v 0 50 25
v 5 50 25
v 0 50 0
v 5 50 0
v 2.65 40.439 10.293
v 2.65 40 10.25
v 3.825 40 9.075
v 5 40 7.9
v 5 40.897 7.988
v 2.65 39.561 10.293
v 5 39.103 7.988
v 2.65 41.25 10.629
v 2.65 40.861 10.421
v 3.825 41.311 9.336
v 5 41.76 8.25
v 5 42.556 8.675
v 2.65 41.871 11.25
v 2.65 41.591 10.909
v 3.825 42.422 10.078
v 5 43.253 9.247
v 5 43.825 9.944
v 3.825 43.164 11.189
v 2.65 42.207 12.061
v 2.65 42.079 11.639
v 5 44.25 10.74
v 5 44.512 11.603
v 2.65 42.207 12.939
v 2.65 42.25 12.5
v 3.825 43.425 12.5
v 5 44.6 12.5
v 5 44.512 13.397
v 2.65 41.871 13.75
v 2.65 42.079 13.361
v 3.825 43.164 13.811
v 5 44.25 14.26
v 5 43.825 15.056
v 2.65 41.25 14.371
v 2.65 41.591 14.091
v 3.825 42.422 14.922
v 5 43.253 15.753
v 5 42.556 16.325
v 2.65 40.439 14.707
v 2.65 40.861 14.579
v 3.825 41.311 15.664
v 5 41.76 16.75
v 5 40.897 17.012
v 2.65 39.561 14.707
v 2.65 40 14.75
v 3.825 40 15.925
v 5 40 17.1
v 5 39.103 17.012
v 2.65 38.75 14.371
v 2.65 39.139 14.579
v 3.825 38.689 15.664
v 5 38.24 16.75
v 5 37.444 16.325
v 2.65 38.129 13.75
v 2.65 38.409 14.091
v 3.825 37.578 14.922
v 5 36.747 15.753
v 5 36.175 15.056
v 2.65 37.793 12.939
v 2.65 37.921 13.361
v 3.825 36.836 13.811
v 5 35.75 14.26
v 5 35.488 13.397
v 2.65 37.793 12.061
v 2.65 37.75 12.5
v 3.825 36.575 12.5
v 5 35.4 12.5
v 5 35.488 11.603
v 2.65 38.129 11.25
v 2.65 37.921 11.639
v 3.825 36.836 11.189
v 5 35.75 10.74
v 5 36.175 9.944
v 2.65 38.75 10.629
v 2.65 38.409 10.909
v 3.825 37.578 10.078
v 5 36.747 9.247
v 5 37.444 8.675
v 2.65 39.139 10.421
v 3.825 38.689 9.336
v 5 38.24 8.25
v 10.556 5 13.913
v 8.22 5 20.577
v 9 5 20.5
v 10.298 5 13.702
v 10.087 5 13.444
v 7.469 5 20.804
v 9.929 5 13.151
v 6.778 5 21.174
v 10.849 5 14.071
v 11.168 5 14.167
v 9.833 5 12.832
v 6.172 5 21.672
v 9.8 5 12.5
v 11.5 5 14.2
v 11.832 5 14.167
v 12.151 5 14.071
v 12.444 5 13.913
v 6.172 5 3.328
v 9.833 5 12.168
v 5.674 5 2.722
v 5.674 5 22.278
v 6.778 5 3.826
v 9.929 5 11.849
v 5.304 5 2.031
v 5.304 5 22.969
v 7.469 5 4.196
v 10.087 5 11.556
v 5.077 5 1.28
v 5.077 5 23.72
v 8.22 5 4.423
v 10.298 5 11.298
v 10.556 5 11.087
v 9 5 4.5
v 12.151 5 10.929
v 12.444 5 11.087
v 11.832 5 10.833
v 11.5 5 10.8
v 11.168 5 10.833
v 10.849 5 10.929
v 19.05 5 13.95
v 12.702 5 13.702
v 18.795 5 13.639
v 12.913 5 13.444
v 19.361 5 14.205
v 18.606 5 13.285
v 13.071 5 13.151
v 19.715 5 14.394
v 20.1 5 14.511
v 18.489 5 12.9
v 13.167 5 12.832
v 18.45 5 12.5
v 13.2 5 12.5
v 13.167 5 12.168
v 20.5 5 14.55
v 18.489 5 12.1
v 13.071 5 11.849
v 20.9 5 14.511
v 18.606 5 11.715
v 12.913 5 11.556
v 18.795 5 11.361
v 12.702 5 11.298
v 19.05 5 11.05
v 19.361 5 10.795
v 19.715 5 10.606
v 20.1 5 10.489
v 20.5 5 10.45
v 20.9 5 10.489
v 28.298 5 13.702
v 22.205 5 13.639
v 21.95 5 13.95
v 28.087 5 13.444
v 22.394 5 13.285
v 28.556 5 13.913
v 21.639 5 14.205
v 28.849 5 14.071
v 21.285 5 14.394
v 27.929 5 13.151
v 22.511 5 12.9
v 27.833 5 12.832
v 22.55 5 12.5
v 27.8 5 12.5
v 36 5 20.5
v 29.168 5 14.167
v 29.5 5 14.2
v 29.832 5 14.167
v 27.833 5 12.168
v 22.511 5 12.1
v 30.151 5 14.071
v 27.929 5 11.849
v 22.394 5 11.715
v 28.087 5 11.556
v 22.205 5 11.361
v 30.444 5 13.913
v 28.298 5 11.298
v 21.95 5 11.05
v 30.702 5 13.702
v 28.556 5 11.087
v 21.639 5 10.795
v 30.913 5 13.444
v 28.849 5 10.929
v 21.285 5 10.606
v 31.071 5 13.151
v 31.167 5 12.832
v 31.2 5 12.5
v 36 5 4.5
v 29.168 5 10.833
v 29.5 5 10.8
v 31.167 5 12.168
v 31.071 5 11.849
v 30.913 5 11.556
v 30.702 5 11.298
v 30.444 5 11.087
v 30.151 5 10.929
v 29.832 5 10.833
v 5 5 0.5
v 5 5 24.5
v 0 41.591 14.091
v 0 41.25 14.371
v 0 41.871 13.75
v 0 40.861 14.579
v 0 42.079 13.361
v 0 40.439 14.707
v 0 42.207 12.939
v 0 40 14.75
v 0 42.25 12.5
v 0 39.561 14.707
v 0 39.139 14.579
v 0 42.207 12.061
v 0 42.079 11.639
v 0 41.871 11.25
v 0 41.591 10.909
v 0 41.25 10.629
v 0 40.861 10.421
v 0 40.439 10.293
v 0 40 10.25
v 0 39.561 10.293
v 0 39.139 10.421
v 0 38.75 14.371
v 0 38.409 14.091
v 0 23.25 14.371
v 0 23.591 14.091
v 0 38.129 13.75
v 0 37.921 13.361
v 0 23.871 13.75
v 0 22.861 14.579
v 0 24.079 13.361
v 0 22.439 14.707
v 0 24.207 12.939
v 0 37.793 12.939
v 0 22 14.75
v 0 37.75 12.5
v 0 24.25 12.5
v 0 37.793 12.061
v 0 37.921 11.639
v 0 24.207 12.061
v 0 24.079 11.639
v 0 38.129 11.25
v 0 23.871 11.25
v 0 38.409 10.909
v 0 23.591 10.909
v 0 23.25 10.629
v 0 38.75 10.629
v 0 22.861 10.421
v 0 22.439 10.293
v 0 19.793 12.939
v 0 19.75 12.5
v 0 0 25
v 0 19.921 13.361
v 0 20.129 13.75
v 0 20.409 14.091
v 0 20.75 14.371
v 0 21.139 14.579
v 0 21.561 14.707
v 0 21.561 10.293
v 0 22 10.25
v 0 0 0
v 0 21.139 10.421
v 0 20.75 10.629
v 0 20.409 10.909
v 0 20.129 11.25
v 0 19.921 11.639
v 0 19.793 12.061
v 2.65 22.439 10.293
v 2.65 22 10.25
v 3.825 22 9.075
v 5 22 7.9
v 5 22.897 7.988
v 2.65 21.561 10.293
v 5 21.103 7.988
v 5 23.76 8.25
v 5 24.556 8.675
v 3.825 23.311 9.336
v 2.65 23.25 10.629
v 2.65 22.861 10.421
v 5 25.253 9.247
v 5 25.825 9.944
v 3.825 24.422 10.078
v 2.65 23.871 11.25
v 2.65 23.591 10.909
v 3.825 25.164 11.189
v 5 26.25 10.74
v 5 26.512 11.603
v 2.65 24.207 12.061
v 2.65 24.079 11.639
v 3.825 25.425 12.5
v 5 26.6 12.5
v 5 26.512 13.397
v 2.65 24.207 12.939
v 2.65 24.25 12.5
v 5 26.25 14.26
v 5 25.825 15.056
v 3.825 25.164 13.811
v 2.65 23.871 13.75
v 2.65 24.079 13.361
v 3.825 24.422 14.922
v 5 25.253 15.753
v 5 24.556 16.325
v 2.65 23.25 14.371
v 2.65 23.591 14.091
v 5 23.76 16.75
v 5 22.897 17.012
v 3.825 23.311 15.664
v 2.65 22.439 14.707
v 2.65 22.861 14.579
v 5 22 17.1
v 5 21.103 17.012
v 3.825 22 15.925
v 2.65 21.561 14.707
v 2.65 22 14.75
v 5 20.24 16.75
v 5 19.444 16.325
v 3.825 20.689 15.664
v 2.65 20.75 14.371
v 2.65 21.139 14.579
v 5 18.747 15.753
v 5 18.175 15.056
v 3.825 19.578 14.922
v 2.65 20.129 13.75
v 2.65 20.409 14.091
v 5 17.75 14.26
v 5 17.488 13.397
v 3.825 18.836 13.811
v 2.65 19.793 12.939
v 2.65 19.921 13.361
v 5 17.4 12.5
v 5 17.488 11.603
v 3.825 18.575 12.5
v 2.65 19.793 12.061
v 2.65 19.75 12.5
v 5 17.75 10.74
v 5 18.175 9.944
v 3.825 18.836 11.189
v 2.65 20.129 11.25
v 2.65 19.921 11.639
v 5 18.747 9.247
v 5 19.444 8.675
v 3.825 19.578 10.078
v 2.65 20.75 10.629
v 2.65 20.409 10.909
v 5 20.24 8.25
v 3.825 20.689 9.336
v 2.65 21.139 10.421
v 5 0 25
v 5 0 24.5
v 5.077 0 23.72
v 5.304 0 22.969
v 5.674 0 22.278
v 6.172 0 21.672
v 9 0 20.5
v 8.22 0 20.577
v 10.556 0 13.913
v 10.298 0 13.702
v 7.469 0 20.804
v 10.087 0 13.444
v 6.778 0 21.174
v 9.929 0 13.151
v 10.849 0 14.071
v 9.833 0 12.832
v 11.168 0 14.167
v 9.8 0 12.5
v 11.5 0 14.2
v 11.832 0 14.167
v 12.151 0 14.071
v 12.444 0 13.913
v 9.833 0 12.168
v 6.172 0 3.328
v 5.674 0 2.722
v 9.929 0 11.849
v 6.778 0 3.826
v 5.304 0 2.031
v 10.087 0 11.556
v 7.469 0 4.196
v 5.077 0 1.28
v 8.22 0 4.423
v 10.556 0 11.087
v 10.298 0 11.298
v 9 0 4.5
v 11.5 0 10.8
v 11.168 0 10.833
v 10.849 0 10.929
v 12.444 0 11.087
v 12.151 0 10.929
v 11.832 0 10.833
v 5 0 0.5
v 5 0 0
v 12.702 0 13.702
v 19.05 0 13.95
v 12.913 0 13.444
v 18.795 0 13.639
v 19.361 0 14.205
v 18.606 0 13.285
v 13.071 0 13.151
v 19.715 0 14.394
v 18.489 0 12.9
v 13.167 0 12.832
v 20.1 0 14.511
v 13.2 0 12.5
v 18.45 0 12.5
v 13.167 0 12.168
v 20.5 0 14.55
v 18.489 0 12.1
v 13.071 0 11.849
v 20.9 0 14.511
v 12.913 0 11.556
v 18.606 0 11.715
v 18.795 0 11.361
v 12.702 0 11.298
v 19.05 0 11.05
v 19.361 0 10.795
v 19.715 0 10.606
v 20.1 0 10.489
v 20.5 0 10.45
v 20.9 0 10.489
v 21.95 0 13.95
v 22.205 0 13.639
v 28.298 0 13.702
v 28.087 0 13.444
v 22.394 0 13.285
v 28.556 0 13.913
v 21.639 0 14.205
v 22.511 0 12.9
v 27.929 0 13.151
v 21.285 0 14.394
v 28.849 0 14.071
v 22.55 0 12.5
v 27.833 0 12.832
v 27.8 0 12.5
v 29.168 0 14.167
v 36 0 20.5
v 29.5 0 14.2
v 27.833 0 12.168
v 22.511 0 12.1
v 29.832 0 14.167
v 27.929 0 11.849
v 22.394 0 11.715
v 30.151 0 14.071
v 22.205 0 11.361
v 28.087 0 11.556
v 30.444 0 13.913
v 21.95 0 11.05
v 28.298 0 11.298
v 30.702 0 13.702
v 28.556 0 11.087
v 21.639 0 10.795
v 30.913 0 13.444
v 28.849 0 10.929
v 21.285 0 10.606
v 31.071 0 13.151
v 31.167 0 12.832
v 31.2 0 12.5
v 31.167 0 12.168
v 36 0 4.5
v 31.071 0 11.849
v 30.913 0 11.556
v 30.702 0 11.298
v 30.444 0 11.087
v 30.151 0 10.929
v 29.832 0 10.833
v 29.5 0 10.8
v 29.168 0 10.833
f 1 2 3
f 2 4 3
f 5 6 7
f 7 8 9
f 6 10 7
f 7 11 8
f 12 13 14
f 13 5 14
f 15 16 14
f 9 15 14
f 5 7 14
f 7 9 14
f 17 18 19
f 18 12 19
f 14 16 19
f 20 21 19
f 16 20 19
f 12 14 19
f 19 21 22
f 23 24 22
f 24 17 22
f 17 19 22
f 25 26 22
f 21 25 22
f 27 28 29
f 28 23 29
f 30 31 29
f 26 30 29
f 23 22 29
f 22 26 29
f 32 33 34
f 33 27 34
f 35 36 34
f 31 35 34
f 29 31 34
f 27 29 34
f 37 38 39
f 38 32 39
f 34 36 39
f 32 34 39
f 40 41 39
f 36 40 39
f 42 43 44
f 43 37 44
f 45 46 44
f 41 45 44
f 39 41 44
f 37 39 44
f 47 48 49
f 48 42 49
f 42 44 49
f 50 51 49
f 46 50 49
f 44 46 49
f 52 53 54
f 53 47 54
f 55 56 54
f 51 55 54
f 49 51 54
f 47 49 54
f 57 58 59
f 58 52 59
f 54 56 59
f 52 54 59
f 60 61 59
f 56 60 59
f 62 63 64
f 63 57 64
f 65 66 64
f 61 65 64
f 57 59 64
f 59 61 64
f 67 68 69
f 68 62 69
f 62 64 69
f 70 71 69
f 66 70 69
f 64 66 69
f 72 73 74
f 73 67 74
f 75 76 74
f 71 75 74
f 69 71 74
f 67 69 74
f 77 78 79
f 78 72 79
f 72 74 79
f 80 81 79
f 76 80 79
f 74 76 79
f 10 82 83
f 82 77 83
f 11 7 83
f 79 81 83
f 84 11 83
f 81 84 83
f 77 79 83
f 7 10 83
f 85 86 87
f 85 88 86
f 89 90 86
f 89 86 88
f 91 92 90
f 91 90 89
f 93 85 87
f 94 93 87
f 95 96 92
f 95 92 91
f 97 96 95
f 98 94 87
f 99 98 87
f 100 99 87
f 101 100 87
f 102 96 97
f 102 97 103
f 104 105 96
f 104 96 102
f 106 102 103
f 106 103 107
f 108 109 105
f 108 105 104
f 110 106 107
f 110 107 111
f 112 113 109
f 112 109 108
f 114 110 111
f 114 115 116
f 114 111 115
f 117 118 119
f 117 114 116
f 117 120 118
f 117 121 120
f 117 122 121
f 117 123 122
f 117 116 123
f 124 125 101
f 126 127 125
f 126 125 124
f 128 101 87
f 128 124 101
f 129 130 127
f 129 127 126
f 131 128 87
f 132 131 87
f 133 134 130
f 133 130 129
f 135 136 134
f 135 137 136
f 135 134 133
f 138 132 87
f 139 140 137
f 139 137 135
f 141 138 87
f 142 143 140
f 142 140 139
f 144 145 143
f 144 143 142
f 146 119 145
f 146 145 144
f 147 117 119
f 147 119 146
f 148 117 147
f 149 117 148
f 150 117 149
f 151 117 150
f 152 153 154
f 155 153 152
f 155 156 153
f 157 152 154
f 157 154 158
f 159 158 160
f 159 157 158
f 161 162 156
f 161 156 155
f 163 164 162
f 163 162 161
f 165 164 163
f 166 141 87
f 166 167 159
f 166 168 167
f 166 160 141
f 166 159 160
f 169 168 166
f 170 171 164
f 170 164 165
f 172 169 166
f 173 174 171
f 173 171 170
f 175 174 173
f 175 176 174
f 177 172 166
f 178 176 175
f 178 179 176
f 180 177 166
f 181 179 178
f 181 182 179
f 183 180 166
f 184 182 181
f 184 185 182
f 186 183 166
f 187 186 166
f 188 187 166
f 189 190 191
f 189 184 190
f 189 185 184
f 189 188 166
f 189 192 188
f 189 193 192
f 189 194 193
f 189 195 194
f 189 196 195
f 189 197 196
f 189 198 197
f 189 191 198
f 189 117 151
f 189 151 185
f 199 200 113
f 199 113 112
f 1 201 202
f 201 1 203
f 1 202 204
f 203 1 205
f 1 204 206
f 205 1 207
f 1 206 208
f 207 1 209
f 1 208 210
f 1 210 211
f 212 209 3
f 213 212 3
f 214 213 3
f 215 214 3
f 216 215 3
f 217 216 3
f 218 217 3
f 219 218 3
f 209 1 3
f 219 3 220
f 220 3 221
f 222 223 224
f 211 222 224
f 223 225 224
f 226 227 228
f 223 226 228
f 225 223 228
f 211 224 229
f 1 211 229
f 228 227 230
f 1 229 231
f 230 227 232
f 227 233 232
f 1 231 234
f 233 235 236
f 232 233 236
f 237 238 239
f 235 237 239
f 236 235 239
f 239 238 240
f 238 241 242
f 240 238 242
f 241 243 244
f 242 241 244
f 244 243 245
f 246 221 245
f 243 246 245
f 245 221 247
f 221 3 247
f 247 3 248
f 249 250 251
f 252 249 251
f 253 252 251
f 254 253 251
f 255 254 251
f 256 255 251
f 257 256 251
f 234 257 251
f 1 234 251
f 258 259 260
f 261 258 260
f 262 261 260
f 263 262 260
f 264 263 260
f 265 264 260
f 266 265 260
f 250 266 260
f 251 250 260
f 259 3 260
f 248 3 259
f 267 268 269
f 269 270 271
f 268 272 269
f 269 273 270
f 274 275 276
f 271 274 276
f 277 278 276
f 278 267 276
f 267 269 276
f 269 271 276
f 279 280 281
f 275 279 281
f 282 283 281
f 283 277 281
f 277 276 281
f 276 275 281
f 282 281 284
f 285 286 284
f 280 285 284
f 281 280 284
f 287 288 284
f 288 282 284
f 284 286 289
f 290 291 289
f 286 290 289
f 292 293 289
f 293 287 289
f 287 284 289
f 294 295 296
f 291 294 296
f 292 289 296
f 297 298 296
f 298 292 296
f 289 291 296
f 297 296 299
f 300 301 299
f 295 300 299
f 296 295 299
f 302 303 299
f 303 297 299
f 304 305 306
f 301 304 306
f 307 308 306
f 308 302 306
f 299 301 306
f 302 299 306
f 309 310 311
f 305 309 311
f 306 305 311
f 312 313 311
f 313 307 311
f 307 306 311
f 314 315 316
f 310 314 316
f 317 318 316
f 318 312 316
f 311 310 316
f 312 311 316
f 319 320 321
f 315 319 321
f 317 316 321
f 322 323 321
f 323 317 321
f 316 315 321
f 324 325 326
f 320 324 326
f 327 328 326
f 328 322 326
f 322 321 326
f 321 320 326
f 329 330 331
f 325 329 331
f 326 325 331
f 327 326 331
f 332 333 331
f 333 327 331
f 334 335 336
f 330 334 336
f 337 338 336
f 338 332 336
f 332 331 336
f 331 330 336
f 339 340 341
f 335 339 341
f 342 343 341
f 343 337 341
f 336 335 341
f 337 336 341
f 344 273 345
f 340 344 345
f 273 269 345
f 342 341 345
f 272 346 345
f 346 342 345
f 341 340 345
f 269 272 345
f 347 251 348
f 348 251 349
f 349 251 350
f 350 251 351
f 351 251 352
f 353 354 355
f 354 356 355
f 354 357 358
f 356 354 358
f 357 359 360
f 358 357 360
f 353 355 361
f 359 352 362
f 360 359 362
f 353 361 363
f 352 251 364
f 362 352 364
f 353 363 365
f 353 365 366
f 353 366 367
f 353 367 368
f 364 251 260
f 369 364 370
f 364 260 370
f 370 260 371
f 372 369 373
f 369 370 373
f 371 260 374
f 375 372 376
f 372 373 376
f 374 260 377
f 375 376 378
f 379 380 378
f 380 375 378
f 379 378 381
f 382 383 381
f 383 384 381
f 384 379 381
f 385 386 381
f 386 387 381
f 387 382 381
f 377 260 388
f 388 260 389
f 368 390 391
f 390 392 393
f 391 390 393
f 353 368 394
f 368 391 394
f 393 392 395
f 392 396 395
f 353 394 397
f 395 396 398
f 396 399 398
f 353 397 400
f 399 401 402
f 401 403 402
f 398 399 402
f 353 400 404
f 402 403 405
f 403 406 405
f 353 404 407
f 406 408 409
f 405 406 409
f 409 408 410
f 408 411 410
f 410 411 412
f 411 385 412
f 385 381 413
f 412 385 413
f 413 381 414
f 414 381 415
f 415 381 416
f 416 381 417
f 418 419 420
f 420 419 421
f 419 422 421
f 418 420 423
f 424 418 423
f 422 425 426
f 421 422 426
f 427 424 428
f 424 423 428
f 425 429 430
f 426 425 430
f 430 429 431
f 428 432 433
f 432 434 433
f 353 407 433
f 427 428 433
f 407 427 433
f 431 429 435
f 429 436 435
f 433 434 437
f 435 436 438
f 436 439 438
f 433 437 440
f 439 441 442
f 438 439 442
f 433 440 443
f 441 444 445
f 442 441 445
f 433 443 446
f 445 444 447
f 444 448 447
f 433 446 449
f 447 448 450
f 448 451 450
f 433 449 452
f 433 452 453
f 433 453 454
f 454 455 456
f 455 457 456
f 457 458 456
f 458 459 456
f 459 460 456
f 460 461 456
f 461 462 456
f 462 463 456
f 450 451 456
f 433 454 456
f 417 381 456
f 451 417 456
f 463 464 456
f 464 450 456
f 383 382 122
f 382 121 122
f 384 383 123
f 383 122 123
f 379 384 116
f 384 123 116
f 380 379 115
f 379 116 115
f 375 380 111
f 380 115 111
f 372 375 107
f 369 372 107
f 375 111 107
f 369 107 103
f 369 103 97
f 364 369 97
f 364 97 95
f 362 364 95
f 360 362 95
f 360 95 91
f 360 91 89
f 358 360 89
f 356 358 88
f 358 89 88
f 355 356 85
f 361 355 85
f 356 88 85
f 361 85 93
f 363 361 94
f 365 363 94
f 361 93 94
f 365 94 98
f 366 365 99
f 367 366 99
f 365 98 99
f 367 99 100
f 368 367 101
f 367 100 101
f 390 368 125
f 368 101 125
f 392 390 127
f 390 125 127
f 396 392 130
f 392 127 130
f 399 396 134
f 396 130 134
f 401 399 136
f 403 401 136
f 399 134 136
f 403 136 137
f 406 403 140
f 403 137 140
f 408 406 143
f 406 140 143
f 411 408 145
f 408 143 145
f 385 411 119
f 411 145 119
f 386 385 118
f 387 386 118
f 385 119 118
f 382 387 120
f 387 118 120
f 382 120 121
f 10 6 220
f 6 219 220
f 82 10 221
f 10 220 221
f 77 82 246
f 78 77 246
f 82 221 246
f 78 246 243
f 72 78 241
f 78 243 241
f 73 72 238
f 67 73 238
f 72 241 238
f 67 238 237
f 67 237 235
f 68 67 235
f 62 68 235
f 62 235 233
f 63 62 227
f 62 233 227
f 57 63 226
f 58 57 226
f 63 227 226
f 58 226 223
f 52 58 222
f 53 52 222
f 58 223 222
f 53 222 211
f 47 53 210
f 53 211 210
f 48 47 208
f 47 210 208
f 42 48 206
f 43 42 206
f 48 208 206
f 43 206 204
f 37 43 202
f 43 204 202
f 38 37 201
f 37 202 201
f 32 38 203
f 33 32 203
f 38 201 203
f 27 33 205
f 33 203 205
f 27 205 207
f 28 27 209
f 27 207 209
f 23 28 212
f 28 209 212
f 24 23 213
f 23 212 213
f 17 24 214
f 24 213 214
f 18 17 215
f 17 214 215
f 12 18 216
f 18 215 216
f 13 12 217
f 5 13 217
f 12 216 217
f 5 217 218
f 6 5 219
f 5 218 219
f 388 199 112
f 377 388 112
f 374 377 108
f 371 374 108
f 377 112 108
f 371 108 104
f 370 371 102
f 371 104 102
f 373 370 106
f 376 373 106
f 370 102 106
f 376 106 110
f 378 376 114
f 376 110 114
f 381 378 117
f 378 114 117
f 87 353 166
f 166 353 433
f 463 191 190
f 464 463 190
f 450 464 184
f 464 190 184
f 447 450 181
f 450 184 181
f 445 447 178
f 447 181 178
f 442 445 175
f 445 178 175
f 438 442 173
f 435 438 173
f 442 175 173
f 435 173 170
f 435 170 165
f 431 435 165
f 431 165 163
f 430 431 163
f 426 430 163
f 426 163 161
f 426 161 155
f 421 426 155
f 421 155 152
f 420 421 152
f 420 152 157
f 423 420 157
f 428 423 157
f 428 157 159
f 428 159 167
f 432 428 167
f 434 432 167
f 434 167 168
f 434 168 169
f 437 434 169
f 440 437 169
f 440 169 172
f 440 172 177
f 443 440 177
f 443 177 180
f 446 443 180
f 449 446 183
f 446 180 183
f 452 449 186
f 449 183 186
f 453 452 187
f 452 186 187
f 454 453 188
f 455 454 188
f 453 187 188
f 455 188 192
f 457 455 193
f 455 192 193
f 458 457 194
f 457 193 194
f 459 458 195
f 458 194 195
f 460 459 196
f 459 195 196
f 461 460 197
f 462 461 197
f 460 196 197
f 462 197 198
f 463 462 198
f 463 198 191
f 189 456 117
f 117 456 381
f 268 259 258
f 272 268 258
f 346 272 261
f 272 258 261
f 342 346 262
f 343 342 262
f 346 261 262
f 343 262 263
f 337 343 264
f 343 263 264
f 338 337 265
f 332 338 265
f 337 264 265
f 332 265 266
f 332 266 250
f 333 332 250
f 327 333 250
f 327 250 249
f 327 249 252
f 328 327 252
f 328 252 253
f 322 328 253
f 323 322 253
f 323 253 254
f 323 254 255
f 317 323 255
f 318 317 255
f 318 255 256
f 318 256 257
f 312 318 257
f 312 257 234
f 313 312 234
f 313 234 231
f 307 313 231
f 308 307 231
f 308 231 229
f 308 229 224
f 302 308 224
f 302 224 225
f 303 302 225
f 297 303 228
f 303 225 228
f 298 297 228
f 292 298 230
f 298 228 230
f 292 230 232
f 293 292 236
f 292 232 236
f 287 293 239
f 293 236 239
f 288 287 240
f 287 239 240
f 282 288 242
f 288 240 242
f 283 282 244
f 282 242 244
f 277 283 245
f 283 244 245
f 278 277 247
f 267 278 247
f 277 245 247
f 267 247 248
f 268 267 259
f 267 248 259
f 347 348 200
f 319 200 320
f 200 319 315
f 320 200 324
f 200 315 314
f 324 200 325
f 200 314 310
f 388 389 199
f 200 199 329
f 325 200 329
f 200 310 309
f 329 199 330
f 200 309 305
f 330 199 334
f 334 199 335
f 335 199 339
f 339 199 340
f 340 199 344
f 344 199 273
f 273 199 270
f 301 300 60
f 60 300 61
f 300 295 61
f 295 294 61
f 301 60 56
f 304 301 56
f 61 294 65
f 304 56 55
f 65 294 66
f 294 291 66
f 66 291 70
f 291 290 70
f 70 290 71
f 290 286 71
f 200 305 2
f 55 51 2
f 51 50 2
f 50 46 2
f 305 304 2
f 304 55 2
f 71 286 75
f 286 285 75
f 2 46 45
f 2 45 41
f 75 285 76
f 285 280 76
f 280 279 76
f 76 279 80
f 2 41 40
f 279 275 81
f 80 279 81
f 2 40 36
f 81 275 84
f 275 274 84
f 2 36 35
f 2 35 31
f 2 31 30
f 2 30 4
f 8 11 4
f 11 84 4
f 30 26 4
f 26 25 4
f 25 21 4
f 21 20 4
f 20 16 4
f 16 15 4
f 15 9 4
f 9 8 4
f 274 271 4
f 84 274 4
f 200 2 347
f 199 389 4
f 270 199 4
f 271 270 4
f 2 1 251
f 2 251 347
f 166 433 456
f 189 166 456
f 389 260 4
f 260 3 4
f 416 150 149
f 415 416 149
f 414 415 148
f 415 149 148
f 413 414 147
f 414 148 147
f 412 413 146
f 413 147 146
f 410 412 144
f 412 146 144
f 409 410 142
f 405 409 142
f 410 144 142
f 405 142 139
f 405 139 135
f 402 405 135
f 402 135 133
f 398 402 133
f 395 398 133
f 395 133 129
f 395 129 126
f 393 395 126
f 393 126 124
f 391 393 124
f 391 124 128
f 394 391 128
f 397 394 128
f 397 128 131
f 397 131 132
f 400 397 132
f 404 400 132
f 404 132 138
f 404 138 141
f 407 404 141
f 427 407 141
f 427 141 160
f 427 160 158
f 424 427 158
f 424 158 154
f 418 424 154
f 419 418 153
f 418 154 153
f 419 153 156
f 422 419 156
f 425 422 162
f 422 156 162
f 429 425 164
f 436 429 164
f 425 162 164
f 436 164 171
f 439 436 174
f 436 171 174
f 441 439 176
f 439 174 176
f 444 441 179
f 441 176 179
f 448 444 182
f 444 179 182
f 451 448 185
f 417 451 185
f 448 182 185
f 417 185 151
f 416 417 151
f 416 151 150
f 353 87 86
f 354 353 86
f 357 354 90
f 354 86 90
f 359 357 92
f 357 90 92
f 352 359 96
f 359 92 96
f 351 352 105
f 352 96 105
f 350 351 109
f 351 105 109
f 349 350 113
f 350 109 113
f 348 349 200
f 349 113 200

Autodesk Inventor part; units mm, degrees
ref_plane "YZ Plane" through (0, 0, 0) normal (1, 0, 0) x (0, 1, 0)
ref_plane "XZ Plane" through (0, 0, 0) normal (0, 1, 0) x (-1, 0, 0)
ref_plane "XY Plane" through (0, 0, 0) normal (0, 0, 1) x (1, 0, 0)
sketch "Skizze1" plane through (0, 0, 0) normal (0, 0, 1) x (1, 0, 0)
  line L0 (5, 5) -> (5, 50)
  line L1 (5, 50) -> (0, 50)
  line L2 (0, 50) -> (0, 0)
  line L3 (5, 5) -> (50, 5)
  line L4 (50, 5) -> (50, 0)
  line L5 (-10, 0) -> (60, 0) projected
  line L6 (0, -10) -> (0, 60) projected
  line L7 (0, 0) -> (50, 0)
  dimension "d3" = 5
  dimension "d4" = 5
  dimension "d5" = 50
  dimension "d6" = 50
extrude "Extrusion1" add sketch "Skizze1" along normal blind 25
sketch "Skizze2" plane through (0, 0, 0) normal (0, -1, 0) x (1, 0, 0)
  line L0 (0, 0) -> (0, 25) projected
  line L1 (50, 0) -> (50, 25) projected
  line L2 (5, 0) -> (5, 25) projected
  line L3 (5, 20.5) -> (36, 20.5)
  line L4 (36, 20.5) -> (36, 4.5)
  line L5 (36, 4.5) -> (5, 4.5)
  line L6 (0, 12.5) -> (50, 12.5)
  line L7 (5, 25) -> (50, 25)
  line L8 (50, 25) -> (50, 0)
  line L9 (50, 0) -> (5, 0)
  line L10 (5, 0) -> (5, 4.5)
  line L11 (5, 20.5) -> (5, 25)
  dimension "d9" = 16
  dimension "d11" = 36
extrude "Extrusion2" cut sketch "Skizze2" against normal through all contours L9 L2 L5 L4 L6 L1 | L6 L4 L3 L2 L7 L1
sketch "Skizze3" plane through (0, 0, 0) normal (0, -1, 0) x (1, 0, 0)
  line L0 (5, 4.5) -> (36, 4.5) projected
  line L1 (36, 4.5) -> (36, 20.5) projected
  line L2 (36, 20.5) -> (5, 20.5) projected
  line L3 (0, 0) -> (0, 25) projected
  line L4 (36, 12.5) -> (0, 12.5)
  line L5 (20.5, 20.5) -> (20.5, 4.5)
  point P0 (20.5, 12.5)
hole "Bohrung1" at (20.5, 0, 12.5) direction (0, 1, 0) diameter 4.1 end through all
sketch "Skizze4" plane through (0, 0, 0) normal (0, -1, 0) x (1, 0, 0)
  line L0 (5, 4.5) -> (36, 4.5) projected
  line L1 (36, 4.5) -> (36, 20.5) projected
  line L2 (36, 20.5) -> (5, 20.5) projected
  line L3 (0, 0) -> (0, 25) projected
  line L4 (20.5, 20.5) -> (20.5, 4.5)
  line L5 (0, 12.5) -> (36, 12.5)
  point P0 (11.5, 12.5)
  point P1 (29.5, 12.5)
  dimension "d21" = 18
hole "Bohrung2" at (11.5, 0, 12.5) at (29.5, 0, 12.5) direction (0, 1, 0) diameter 3.4 end through all
fillet "Rundung1" radius 4 2 edges at (5, 2.5, 20.5) (5, 2.5, 4.5)
sketch "Skizze5" plane through (5, 0, 0) normal (1, 0, 0) x (0, 0, -1)
  line L0 (0, 50) -> (-25, 50) projected
  line L1 (-0.5, 5) -> (-24.5, 5) projected
  line L2 (-12.5, 50) -> (-12.5, 9.3168)
  point P0 (-12.5, 40)
  point P1 (-12.5, 22)
  dimension "d30" = 10
  dimension "d31" = 18
hole "Bohrung3" at (5, 40, 12.5) at (5, 22, 12.5) direction (-1, 0, 0) diameter 4.5 end through all countersink diameter 9.2 countersink angle 90
properties part number "1_0204_013"
